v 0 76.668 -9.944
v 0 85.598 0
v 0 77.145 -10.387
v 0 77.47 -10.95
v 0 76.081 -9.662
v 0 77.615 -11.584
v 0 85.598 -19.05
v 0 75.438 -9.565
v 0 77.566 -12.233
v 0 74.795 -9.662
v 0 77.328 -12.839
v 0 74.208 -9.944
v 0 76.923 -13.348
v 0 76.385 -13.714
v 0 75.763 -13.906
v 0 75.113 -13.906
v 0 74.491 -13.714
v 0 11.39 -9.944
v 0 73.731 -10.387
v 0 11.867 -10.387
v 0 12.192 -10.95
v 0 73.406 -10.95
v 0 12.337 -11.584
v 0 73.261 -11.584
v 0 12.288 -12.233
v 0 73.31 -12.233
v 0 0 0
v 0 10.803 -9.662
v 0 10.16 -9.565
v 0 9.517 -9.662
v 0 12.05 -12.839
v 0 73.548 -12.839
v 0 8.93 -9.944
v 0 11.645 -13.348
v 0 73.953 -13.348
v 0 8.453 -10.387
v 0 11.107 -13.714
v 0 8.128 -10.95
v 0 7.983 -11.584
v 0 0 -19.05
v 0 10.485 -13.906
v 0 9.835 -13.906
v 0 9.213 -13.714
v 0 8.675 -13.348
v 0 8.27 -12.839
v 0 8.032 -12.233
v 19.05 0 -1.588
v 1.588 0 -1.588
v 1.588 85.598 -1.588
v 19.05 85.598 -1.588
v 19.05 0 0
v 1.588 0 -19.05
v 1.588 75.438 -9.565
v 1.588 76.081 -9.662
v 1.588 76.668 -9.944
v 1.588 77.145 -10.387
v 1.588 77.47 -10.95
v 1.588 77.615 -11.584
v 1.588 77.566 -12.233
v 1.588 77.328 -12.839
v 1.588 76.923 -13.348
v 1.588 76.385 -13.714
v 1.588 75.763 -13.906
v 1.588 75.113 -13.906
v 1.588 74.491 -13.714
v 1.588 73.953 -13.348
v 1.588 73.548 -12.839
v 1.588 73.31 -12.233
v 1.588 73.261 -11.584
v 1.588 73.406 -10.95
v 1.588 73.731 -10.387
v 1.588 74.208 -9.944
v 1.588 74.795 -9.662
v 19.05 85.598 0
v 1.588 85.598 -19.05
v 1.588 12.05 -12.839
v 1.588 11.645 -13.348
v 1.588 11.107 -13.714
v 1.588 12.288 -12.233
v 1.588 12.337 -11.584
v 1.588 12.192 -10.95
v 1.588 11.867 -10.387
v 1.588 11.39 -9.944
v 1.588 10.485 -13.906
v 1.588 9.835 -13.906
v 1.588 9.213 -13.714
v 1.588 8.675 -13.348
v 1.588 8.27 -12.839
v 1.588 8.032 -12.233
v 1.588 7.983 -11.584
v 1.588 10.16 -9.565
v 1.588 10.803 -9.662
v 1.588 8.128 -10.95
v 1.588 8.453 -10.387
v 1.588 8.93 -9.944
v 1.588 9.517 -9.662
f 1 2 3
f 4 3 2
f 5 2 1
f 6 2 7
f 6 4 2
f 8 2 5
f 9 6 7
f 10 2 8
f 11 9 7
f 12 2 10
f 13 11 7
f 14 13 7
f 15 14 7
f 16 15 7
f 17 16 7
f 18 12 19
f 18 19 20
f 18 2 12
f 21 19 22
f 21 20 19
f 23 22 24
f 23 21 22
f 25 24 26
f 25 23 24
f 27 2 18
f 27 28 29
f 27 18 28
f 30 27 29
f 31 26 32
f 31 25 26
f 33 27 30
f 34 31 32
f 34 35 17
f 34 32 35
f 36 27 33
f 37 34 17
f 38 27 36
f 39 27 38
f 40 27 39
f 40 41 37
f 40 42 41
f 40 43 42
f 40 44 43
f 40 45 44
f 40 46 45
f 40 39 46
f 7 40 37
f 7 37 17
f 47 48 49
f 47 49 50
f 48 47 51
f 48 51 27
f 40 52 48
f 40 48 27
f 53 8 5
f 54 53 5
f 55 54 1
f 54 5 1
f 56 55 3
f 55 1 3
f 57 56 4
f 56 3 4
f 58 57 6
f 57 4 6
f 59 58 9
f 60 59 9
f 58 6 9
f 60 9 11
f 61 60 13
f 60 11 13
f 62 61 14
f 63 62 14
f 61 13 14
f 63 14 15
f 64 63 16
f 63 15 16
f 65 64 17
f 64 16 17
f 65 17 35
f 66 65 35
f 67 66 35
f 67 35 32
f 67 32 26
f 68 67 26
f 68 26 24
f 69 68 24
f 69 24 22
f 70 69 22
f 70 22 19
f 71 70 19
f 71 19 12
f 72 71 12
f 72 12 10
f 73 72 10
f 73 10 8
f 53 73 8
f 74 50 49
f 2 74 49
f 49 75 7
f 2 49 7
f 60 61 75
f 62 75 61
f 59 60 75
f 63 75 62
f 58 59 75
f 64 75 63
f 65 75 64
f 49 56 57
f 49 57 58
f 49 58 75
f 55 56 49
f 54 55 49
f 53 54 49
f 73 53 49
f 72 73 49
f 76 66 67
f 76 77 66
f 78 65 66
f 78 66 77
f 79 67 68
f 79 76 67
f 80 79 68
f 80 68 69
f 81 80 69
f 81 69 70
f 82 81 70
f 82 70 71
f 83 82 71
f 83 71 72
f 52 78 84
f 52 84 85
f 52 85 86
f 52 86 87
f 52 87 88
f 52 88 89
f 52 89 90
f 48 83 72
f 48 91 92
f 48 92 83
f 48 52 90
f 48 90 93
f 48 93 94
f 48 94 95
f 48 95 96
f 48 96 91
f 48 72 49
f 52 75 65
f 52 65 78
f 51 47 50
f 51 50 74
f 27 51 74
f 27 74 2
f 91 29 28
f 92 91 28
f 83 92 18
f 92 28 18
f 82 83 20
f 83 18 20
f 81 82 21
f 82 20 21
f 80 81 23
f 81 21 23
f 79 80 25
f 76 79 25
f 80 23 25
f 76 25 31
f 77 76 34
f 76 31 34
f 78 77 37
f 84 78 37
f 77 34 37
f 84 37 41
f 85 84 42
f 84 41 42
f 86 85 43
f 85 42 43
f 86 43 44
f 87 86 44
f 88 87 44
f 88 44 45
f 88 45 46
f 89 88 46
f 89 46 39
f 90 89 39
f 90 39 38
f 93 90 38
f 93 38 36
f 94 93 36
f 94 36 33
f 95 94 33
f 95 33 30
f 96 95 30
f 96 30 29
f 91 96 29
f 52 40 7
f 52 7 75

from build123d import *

# Parameters (mm, degrees)
BOSS_EXTRUDE1_DEPTH = 85.598
SKETCH2_R           = 2.1828125
CUT_EXTRUDE1_DEPTH  = 90.737520603


with BuildPart() as part:
    # Sketch1 → Boss-Extrude1 (new body)
    with BuildSketch(Plane(origin=(0, 0, 0), x_dir=(1, 0, 0), z_dir=(0, 1, 0))):
        Polygon((0, 0), (0, 19.05), (1.5875, 19.05), (1.5875, 1.5875), (19.05, 1.5875), (19.05, 0), align=None)
    extrude(amount=BOSS_EXTRUDE1_DEPTH)

    # Sketch2 → Cut-Extrude1 (cut, through all)
    with BuildSketch(Plane.ZY):
        with Locations((-11.7475, 75.438)):
            Circle(SKETCH2_R)
        with Locations((-11.7475, 10.16)):
            Circle(SKETCH2_R)
    extrude(amount=-CUT_EXTRUDE1_DEPTH, mode=Mode.SUBTRACT)


solid = part.part
